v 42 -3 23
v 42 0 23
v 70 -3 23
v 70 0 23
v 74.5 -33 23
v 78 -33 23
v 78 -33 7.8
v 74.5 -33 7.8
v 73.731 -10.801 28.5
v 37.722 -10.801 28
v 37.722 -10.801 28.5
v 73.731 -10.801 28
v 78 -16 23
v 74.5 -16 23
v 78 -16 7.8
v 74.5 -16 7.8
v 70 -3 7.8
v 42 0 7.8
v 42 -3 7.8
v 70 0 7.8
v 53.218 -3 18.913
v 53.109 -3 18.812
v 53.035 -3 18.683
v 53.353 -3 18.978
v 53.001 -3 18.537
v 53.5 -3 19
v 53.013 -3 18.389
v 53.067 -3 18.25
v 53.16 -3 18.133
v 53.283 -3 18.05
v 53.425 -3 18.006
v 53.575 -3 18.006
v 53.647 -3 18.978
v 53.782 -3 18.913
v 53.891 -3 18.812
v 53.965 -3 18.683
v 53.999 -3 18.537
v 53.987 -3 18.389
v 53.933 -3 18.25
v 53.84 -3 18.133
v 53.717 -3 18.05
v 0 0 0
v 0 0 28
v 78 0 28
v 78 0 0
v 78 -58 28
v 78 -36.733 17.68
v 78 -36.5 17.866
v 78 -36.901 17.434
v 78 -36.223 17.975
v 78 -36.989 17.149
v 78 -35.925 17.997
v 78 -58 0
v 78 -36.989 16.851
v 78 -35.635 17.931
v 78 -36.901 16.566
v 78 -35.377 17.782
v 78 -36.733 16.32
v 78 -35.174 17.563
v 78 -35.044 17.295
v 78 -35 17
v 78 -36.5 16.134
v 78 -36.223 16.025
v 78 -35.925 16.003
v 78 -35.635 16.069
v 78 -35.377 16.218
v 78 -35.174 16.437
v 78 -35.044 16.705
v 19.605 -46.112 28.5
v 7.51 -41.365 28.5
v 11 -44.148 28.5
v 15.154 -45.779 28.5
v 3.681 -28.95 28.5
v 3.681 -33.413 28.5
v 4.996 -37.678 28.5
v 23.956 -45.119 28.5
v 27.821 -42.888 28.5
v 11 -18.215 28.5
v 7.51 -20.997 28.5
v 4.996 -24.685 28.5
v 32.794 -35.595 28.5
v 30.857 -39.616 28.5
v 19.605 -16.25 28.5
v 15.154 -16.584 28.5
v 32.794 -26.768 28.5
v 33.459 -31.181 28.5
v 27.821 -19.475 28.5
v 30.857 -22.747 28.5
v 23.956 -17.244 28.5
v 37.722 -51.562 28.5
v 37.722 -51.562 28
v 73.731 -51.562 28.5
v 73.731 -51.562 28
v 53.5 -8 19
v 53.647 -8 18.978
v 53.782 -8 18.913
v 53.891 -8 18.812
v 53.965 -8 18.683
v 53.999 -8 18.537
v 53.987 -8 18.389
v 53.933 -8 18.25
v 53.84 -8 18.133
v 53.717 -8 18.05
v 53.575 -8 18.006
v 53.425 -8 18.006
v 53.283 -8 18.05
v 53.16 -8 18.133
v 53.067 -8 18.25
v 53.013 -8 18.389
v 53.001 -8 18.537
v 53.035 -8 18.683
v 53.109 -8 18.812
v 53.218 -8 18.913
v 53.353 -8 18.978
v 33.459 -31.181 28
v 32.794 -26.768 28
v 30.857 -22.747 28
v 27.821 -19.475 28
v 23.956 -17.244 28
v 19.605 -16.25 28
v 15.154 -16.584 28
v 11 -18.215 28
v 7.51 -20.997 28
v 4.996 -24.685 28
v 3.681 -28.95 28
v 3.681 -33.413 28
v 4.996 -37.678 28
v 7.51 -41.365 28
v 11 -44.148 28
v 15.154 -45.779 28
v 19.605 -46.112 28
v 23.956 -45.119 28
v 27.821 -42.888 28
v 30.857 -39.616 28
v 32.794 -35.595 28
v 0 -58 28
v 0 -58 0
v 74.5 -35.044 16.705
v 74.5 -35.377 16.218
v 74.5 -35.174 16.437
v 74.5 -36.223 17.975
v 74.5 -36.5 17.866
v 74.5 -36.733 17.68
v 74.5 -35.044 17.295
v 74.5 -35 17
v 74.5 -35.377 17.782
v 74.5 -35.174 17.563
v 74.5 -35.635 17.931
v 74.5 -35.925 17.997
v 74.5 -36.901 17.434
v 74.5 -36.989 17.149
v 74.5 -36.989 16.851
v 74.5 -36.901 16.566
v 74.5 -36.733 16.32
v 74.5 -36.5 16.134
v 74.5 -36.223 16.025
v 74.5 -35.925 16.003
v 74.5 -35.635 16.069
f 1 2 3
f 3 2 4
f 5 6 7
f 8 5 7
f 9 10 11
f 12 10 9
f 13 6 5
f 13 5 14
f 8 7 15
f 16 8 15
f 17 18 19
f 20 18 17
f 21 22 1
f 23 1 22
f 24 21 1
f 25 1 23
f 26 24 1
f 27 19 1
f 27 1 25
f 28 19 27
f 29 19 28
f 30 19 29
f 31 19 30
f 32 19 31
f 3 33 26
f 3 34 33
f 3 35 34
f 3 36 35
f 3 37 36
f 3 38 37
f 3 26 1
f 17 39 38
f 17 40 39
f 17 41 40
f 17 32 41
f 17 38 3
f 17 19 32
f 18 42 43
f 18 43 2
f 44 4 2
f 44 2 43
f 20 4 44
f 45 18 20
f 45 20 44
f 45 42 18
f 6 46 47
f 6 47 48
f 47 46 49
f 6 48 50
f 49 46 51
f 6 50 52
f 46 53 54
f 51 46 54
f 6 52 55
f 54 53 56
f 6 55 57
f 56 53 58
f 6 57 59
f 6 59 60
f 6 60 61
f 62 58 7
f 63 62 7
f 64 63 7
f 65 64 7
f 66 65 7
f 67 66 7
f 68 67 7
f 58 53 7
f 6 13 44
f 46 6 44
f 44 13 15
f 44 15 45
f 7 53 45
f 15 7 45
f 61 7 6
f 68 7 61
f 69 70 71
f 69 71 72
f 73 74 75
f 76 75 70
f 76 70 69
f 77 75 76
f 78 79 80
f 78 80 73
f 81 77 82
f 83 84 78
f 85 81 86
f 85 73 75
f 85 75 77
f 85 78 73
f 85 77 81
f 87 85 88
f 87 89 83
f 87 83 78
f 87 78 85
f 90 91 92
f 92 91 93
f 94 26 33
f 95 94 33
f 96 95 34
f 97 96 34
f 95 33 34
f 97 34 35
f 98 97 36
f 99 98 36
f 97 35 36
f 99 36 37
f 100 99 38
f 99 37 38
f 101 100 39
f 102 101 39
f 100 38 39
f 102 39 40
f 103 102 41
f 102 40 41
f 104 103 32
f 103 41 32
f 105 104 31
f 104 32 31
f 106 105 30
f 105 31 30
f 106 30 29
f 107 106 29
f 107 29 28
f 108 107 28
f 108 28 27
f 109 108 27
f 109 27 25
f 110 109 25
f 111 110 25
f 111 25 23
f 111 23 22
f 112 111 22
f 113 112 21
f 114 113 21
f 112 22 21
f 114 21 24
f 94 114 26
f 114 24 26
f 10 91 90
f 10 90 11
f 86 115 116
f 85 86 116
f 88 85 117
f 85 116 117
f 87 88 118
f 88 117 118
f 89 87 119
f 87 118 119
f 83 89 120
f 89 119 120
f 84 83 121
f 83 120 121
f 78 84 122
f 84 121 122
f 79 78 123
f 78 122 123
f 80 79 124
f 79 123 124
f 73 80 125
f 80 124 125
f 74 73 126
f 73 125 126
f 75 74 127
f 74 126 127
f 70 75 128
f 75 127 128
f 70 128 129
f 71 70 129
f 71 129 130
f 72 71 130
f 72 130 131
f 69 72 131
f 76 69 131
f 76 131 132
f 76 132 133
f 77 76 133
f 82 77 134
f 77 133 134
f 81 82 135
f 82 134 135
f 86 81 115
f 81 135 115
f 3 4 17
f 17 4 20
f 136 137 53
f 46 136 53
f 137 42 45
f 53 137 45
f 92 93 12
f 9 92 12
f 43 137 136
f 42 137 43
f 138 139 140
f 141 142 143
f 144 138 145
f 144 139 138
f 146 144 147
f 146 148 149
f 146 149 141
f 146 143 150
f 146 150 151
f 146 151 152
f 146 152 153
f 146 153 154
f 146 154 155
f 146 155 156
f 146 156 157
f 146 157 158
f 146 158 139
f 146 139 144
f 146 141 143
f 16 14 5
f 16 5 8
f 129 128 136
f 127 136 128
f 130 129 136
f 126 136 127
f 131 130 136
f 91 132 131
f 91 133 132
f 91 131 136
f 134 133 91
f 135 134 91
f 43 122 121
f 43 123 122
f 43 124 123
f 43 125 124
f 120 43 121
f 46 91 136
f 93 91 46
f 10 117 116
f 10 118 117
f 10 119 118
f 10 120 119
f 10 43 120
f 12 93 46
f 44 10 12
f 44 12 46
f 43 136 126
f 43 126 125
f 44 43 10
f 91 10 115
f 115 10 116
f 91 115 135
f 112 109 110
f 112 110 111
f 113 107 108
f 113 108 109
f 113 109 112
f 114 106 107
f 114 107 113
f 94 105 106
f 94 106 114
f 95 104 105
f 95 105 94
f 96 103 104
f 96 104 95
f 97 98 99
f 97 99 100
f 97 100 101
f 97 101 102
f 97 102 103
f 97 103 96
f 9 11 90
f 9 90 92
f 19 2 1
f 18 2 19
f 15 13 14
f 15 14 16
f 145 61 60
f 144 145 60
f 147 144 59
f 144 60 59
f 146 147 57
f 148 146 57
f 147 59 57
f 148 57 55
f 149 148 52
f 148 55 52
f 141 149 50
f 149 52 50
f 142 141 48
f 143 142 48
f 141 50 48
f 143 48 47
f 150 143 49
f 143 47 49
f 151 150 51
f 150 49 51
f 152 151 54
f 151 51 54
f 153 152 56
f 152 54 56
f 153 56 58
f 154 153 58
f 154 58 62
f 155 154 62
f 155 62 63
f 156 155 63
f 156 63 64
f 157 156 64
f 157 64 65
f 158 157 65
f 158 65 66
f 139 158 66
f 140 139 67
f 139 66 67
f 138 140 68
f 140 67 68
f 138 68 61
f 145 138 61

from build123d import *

# Parameters (mm, degrees)
SKETCH_1_W          = 78
SKETCH_1_H          = 58
EXTRUDE_1_DEPTH     = 28
SKETCH_2_W          = 28
SKETCH_2_H          = 15.2
CUT_EXTRUDE_1_DEPTH = 3
SKETCH_5_R          = 14.972823893
SKETCH_5_W          = 36.008932868
SKETCH_5_H          = 40.760932053
EXTRUDE_4_DEPTH     = 0.5
SKETCH_6_R          = 0.5
CUT_EXTRUDE_2_DEPTH = 5
SKETCH_7_R          = 1
SKETCH_7_W          = 15.2
SKETCH_7_H          = 17
CUT_EXTRUDE_3_DEPTH = 3.5


with BuildPart() as part:
    # 草图1 → 凸台-拉伸1 (new body)
    with BuildSketch(Plane.XY):
        with Locations((39, -29)):
            Rectangle(SKETCH_1_W, SKETCH_1_H)
    extrude(amount=EXTRUDE_1_DEPTH)

    # 草图2 → 切除-拉伸1 (cut)
    with BuildSketch(Plane(origin=(0, 0, 0), x_dir=(1, 0, 0), z_dir=(0, 1, 0))):
        with Locations((56, -15.4)):
            Rectangle(SKETCH_2_W, SKETCH_2_H)
    extrude(amount=-CUT_EXTRUDE_1_DEPTH, mode=Mode.SUBTRACT)

    # 草图5 → 凸台-拉伸4 (add)
    with BuildSketch(Plane.XY.offset(28)):
        with Locations((18.486091334, -31.18136891)):
            Circle(SKETCH_5_R)
        with Locations((55.726307101, -31.18136891)):
            Rectangle(SKETCH_5_W, SKETCH_5_H)
    extrude(amount=EXTRUDE_4_DEPTH)

    # 草图6 → 切除-拉伸2 (cut)
    with BuildSketch(Plane(origin=(0, -3, 0), x_dir=(1, 0, 0), z_dir=(0, 1, 0))):
        with Locations(Location((53.5, -18.5, 0), (0, 0, 270))):
            Circle(SKETCH_6_R)
    extrude(amount=-CUT_EXTRUDE_2_DEPTH, mode=Mode.SUBTRACT)

    # 草图7 → 切除-拉伸3 (cut)
    with BuildSketch(Plane(origin=(78, 0, 0), x_dir=(0, 0, -1), z_dir=(1, 0, 0))):
        with Locations(Location((-17, -36, 0), (0, 0, 90))):
            Circle(SKETCH_7_R)
        with Locations((-15.4, -24.5)):
            Rectangle(SKETCH_7_W, SKETCH_7_H)
    extrude(amount=-CUT_EXTRUDE_3_DEPTH, mode=Mode.SUBTRACT)


solid = part.part
